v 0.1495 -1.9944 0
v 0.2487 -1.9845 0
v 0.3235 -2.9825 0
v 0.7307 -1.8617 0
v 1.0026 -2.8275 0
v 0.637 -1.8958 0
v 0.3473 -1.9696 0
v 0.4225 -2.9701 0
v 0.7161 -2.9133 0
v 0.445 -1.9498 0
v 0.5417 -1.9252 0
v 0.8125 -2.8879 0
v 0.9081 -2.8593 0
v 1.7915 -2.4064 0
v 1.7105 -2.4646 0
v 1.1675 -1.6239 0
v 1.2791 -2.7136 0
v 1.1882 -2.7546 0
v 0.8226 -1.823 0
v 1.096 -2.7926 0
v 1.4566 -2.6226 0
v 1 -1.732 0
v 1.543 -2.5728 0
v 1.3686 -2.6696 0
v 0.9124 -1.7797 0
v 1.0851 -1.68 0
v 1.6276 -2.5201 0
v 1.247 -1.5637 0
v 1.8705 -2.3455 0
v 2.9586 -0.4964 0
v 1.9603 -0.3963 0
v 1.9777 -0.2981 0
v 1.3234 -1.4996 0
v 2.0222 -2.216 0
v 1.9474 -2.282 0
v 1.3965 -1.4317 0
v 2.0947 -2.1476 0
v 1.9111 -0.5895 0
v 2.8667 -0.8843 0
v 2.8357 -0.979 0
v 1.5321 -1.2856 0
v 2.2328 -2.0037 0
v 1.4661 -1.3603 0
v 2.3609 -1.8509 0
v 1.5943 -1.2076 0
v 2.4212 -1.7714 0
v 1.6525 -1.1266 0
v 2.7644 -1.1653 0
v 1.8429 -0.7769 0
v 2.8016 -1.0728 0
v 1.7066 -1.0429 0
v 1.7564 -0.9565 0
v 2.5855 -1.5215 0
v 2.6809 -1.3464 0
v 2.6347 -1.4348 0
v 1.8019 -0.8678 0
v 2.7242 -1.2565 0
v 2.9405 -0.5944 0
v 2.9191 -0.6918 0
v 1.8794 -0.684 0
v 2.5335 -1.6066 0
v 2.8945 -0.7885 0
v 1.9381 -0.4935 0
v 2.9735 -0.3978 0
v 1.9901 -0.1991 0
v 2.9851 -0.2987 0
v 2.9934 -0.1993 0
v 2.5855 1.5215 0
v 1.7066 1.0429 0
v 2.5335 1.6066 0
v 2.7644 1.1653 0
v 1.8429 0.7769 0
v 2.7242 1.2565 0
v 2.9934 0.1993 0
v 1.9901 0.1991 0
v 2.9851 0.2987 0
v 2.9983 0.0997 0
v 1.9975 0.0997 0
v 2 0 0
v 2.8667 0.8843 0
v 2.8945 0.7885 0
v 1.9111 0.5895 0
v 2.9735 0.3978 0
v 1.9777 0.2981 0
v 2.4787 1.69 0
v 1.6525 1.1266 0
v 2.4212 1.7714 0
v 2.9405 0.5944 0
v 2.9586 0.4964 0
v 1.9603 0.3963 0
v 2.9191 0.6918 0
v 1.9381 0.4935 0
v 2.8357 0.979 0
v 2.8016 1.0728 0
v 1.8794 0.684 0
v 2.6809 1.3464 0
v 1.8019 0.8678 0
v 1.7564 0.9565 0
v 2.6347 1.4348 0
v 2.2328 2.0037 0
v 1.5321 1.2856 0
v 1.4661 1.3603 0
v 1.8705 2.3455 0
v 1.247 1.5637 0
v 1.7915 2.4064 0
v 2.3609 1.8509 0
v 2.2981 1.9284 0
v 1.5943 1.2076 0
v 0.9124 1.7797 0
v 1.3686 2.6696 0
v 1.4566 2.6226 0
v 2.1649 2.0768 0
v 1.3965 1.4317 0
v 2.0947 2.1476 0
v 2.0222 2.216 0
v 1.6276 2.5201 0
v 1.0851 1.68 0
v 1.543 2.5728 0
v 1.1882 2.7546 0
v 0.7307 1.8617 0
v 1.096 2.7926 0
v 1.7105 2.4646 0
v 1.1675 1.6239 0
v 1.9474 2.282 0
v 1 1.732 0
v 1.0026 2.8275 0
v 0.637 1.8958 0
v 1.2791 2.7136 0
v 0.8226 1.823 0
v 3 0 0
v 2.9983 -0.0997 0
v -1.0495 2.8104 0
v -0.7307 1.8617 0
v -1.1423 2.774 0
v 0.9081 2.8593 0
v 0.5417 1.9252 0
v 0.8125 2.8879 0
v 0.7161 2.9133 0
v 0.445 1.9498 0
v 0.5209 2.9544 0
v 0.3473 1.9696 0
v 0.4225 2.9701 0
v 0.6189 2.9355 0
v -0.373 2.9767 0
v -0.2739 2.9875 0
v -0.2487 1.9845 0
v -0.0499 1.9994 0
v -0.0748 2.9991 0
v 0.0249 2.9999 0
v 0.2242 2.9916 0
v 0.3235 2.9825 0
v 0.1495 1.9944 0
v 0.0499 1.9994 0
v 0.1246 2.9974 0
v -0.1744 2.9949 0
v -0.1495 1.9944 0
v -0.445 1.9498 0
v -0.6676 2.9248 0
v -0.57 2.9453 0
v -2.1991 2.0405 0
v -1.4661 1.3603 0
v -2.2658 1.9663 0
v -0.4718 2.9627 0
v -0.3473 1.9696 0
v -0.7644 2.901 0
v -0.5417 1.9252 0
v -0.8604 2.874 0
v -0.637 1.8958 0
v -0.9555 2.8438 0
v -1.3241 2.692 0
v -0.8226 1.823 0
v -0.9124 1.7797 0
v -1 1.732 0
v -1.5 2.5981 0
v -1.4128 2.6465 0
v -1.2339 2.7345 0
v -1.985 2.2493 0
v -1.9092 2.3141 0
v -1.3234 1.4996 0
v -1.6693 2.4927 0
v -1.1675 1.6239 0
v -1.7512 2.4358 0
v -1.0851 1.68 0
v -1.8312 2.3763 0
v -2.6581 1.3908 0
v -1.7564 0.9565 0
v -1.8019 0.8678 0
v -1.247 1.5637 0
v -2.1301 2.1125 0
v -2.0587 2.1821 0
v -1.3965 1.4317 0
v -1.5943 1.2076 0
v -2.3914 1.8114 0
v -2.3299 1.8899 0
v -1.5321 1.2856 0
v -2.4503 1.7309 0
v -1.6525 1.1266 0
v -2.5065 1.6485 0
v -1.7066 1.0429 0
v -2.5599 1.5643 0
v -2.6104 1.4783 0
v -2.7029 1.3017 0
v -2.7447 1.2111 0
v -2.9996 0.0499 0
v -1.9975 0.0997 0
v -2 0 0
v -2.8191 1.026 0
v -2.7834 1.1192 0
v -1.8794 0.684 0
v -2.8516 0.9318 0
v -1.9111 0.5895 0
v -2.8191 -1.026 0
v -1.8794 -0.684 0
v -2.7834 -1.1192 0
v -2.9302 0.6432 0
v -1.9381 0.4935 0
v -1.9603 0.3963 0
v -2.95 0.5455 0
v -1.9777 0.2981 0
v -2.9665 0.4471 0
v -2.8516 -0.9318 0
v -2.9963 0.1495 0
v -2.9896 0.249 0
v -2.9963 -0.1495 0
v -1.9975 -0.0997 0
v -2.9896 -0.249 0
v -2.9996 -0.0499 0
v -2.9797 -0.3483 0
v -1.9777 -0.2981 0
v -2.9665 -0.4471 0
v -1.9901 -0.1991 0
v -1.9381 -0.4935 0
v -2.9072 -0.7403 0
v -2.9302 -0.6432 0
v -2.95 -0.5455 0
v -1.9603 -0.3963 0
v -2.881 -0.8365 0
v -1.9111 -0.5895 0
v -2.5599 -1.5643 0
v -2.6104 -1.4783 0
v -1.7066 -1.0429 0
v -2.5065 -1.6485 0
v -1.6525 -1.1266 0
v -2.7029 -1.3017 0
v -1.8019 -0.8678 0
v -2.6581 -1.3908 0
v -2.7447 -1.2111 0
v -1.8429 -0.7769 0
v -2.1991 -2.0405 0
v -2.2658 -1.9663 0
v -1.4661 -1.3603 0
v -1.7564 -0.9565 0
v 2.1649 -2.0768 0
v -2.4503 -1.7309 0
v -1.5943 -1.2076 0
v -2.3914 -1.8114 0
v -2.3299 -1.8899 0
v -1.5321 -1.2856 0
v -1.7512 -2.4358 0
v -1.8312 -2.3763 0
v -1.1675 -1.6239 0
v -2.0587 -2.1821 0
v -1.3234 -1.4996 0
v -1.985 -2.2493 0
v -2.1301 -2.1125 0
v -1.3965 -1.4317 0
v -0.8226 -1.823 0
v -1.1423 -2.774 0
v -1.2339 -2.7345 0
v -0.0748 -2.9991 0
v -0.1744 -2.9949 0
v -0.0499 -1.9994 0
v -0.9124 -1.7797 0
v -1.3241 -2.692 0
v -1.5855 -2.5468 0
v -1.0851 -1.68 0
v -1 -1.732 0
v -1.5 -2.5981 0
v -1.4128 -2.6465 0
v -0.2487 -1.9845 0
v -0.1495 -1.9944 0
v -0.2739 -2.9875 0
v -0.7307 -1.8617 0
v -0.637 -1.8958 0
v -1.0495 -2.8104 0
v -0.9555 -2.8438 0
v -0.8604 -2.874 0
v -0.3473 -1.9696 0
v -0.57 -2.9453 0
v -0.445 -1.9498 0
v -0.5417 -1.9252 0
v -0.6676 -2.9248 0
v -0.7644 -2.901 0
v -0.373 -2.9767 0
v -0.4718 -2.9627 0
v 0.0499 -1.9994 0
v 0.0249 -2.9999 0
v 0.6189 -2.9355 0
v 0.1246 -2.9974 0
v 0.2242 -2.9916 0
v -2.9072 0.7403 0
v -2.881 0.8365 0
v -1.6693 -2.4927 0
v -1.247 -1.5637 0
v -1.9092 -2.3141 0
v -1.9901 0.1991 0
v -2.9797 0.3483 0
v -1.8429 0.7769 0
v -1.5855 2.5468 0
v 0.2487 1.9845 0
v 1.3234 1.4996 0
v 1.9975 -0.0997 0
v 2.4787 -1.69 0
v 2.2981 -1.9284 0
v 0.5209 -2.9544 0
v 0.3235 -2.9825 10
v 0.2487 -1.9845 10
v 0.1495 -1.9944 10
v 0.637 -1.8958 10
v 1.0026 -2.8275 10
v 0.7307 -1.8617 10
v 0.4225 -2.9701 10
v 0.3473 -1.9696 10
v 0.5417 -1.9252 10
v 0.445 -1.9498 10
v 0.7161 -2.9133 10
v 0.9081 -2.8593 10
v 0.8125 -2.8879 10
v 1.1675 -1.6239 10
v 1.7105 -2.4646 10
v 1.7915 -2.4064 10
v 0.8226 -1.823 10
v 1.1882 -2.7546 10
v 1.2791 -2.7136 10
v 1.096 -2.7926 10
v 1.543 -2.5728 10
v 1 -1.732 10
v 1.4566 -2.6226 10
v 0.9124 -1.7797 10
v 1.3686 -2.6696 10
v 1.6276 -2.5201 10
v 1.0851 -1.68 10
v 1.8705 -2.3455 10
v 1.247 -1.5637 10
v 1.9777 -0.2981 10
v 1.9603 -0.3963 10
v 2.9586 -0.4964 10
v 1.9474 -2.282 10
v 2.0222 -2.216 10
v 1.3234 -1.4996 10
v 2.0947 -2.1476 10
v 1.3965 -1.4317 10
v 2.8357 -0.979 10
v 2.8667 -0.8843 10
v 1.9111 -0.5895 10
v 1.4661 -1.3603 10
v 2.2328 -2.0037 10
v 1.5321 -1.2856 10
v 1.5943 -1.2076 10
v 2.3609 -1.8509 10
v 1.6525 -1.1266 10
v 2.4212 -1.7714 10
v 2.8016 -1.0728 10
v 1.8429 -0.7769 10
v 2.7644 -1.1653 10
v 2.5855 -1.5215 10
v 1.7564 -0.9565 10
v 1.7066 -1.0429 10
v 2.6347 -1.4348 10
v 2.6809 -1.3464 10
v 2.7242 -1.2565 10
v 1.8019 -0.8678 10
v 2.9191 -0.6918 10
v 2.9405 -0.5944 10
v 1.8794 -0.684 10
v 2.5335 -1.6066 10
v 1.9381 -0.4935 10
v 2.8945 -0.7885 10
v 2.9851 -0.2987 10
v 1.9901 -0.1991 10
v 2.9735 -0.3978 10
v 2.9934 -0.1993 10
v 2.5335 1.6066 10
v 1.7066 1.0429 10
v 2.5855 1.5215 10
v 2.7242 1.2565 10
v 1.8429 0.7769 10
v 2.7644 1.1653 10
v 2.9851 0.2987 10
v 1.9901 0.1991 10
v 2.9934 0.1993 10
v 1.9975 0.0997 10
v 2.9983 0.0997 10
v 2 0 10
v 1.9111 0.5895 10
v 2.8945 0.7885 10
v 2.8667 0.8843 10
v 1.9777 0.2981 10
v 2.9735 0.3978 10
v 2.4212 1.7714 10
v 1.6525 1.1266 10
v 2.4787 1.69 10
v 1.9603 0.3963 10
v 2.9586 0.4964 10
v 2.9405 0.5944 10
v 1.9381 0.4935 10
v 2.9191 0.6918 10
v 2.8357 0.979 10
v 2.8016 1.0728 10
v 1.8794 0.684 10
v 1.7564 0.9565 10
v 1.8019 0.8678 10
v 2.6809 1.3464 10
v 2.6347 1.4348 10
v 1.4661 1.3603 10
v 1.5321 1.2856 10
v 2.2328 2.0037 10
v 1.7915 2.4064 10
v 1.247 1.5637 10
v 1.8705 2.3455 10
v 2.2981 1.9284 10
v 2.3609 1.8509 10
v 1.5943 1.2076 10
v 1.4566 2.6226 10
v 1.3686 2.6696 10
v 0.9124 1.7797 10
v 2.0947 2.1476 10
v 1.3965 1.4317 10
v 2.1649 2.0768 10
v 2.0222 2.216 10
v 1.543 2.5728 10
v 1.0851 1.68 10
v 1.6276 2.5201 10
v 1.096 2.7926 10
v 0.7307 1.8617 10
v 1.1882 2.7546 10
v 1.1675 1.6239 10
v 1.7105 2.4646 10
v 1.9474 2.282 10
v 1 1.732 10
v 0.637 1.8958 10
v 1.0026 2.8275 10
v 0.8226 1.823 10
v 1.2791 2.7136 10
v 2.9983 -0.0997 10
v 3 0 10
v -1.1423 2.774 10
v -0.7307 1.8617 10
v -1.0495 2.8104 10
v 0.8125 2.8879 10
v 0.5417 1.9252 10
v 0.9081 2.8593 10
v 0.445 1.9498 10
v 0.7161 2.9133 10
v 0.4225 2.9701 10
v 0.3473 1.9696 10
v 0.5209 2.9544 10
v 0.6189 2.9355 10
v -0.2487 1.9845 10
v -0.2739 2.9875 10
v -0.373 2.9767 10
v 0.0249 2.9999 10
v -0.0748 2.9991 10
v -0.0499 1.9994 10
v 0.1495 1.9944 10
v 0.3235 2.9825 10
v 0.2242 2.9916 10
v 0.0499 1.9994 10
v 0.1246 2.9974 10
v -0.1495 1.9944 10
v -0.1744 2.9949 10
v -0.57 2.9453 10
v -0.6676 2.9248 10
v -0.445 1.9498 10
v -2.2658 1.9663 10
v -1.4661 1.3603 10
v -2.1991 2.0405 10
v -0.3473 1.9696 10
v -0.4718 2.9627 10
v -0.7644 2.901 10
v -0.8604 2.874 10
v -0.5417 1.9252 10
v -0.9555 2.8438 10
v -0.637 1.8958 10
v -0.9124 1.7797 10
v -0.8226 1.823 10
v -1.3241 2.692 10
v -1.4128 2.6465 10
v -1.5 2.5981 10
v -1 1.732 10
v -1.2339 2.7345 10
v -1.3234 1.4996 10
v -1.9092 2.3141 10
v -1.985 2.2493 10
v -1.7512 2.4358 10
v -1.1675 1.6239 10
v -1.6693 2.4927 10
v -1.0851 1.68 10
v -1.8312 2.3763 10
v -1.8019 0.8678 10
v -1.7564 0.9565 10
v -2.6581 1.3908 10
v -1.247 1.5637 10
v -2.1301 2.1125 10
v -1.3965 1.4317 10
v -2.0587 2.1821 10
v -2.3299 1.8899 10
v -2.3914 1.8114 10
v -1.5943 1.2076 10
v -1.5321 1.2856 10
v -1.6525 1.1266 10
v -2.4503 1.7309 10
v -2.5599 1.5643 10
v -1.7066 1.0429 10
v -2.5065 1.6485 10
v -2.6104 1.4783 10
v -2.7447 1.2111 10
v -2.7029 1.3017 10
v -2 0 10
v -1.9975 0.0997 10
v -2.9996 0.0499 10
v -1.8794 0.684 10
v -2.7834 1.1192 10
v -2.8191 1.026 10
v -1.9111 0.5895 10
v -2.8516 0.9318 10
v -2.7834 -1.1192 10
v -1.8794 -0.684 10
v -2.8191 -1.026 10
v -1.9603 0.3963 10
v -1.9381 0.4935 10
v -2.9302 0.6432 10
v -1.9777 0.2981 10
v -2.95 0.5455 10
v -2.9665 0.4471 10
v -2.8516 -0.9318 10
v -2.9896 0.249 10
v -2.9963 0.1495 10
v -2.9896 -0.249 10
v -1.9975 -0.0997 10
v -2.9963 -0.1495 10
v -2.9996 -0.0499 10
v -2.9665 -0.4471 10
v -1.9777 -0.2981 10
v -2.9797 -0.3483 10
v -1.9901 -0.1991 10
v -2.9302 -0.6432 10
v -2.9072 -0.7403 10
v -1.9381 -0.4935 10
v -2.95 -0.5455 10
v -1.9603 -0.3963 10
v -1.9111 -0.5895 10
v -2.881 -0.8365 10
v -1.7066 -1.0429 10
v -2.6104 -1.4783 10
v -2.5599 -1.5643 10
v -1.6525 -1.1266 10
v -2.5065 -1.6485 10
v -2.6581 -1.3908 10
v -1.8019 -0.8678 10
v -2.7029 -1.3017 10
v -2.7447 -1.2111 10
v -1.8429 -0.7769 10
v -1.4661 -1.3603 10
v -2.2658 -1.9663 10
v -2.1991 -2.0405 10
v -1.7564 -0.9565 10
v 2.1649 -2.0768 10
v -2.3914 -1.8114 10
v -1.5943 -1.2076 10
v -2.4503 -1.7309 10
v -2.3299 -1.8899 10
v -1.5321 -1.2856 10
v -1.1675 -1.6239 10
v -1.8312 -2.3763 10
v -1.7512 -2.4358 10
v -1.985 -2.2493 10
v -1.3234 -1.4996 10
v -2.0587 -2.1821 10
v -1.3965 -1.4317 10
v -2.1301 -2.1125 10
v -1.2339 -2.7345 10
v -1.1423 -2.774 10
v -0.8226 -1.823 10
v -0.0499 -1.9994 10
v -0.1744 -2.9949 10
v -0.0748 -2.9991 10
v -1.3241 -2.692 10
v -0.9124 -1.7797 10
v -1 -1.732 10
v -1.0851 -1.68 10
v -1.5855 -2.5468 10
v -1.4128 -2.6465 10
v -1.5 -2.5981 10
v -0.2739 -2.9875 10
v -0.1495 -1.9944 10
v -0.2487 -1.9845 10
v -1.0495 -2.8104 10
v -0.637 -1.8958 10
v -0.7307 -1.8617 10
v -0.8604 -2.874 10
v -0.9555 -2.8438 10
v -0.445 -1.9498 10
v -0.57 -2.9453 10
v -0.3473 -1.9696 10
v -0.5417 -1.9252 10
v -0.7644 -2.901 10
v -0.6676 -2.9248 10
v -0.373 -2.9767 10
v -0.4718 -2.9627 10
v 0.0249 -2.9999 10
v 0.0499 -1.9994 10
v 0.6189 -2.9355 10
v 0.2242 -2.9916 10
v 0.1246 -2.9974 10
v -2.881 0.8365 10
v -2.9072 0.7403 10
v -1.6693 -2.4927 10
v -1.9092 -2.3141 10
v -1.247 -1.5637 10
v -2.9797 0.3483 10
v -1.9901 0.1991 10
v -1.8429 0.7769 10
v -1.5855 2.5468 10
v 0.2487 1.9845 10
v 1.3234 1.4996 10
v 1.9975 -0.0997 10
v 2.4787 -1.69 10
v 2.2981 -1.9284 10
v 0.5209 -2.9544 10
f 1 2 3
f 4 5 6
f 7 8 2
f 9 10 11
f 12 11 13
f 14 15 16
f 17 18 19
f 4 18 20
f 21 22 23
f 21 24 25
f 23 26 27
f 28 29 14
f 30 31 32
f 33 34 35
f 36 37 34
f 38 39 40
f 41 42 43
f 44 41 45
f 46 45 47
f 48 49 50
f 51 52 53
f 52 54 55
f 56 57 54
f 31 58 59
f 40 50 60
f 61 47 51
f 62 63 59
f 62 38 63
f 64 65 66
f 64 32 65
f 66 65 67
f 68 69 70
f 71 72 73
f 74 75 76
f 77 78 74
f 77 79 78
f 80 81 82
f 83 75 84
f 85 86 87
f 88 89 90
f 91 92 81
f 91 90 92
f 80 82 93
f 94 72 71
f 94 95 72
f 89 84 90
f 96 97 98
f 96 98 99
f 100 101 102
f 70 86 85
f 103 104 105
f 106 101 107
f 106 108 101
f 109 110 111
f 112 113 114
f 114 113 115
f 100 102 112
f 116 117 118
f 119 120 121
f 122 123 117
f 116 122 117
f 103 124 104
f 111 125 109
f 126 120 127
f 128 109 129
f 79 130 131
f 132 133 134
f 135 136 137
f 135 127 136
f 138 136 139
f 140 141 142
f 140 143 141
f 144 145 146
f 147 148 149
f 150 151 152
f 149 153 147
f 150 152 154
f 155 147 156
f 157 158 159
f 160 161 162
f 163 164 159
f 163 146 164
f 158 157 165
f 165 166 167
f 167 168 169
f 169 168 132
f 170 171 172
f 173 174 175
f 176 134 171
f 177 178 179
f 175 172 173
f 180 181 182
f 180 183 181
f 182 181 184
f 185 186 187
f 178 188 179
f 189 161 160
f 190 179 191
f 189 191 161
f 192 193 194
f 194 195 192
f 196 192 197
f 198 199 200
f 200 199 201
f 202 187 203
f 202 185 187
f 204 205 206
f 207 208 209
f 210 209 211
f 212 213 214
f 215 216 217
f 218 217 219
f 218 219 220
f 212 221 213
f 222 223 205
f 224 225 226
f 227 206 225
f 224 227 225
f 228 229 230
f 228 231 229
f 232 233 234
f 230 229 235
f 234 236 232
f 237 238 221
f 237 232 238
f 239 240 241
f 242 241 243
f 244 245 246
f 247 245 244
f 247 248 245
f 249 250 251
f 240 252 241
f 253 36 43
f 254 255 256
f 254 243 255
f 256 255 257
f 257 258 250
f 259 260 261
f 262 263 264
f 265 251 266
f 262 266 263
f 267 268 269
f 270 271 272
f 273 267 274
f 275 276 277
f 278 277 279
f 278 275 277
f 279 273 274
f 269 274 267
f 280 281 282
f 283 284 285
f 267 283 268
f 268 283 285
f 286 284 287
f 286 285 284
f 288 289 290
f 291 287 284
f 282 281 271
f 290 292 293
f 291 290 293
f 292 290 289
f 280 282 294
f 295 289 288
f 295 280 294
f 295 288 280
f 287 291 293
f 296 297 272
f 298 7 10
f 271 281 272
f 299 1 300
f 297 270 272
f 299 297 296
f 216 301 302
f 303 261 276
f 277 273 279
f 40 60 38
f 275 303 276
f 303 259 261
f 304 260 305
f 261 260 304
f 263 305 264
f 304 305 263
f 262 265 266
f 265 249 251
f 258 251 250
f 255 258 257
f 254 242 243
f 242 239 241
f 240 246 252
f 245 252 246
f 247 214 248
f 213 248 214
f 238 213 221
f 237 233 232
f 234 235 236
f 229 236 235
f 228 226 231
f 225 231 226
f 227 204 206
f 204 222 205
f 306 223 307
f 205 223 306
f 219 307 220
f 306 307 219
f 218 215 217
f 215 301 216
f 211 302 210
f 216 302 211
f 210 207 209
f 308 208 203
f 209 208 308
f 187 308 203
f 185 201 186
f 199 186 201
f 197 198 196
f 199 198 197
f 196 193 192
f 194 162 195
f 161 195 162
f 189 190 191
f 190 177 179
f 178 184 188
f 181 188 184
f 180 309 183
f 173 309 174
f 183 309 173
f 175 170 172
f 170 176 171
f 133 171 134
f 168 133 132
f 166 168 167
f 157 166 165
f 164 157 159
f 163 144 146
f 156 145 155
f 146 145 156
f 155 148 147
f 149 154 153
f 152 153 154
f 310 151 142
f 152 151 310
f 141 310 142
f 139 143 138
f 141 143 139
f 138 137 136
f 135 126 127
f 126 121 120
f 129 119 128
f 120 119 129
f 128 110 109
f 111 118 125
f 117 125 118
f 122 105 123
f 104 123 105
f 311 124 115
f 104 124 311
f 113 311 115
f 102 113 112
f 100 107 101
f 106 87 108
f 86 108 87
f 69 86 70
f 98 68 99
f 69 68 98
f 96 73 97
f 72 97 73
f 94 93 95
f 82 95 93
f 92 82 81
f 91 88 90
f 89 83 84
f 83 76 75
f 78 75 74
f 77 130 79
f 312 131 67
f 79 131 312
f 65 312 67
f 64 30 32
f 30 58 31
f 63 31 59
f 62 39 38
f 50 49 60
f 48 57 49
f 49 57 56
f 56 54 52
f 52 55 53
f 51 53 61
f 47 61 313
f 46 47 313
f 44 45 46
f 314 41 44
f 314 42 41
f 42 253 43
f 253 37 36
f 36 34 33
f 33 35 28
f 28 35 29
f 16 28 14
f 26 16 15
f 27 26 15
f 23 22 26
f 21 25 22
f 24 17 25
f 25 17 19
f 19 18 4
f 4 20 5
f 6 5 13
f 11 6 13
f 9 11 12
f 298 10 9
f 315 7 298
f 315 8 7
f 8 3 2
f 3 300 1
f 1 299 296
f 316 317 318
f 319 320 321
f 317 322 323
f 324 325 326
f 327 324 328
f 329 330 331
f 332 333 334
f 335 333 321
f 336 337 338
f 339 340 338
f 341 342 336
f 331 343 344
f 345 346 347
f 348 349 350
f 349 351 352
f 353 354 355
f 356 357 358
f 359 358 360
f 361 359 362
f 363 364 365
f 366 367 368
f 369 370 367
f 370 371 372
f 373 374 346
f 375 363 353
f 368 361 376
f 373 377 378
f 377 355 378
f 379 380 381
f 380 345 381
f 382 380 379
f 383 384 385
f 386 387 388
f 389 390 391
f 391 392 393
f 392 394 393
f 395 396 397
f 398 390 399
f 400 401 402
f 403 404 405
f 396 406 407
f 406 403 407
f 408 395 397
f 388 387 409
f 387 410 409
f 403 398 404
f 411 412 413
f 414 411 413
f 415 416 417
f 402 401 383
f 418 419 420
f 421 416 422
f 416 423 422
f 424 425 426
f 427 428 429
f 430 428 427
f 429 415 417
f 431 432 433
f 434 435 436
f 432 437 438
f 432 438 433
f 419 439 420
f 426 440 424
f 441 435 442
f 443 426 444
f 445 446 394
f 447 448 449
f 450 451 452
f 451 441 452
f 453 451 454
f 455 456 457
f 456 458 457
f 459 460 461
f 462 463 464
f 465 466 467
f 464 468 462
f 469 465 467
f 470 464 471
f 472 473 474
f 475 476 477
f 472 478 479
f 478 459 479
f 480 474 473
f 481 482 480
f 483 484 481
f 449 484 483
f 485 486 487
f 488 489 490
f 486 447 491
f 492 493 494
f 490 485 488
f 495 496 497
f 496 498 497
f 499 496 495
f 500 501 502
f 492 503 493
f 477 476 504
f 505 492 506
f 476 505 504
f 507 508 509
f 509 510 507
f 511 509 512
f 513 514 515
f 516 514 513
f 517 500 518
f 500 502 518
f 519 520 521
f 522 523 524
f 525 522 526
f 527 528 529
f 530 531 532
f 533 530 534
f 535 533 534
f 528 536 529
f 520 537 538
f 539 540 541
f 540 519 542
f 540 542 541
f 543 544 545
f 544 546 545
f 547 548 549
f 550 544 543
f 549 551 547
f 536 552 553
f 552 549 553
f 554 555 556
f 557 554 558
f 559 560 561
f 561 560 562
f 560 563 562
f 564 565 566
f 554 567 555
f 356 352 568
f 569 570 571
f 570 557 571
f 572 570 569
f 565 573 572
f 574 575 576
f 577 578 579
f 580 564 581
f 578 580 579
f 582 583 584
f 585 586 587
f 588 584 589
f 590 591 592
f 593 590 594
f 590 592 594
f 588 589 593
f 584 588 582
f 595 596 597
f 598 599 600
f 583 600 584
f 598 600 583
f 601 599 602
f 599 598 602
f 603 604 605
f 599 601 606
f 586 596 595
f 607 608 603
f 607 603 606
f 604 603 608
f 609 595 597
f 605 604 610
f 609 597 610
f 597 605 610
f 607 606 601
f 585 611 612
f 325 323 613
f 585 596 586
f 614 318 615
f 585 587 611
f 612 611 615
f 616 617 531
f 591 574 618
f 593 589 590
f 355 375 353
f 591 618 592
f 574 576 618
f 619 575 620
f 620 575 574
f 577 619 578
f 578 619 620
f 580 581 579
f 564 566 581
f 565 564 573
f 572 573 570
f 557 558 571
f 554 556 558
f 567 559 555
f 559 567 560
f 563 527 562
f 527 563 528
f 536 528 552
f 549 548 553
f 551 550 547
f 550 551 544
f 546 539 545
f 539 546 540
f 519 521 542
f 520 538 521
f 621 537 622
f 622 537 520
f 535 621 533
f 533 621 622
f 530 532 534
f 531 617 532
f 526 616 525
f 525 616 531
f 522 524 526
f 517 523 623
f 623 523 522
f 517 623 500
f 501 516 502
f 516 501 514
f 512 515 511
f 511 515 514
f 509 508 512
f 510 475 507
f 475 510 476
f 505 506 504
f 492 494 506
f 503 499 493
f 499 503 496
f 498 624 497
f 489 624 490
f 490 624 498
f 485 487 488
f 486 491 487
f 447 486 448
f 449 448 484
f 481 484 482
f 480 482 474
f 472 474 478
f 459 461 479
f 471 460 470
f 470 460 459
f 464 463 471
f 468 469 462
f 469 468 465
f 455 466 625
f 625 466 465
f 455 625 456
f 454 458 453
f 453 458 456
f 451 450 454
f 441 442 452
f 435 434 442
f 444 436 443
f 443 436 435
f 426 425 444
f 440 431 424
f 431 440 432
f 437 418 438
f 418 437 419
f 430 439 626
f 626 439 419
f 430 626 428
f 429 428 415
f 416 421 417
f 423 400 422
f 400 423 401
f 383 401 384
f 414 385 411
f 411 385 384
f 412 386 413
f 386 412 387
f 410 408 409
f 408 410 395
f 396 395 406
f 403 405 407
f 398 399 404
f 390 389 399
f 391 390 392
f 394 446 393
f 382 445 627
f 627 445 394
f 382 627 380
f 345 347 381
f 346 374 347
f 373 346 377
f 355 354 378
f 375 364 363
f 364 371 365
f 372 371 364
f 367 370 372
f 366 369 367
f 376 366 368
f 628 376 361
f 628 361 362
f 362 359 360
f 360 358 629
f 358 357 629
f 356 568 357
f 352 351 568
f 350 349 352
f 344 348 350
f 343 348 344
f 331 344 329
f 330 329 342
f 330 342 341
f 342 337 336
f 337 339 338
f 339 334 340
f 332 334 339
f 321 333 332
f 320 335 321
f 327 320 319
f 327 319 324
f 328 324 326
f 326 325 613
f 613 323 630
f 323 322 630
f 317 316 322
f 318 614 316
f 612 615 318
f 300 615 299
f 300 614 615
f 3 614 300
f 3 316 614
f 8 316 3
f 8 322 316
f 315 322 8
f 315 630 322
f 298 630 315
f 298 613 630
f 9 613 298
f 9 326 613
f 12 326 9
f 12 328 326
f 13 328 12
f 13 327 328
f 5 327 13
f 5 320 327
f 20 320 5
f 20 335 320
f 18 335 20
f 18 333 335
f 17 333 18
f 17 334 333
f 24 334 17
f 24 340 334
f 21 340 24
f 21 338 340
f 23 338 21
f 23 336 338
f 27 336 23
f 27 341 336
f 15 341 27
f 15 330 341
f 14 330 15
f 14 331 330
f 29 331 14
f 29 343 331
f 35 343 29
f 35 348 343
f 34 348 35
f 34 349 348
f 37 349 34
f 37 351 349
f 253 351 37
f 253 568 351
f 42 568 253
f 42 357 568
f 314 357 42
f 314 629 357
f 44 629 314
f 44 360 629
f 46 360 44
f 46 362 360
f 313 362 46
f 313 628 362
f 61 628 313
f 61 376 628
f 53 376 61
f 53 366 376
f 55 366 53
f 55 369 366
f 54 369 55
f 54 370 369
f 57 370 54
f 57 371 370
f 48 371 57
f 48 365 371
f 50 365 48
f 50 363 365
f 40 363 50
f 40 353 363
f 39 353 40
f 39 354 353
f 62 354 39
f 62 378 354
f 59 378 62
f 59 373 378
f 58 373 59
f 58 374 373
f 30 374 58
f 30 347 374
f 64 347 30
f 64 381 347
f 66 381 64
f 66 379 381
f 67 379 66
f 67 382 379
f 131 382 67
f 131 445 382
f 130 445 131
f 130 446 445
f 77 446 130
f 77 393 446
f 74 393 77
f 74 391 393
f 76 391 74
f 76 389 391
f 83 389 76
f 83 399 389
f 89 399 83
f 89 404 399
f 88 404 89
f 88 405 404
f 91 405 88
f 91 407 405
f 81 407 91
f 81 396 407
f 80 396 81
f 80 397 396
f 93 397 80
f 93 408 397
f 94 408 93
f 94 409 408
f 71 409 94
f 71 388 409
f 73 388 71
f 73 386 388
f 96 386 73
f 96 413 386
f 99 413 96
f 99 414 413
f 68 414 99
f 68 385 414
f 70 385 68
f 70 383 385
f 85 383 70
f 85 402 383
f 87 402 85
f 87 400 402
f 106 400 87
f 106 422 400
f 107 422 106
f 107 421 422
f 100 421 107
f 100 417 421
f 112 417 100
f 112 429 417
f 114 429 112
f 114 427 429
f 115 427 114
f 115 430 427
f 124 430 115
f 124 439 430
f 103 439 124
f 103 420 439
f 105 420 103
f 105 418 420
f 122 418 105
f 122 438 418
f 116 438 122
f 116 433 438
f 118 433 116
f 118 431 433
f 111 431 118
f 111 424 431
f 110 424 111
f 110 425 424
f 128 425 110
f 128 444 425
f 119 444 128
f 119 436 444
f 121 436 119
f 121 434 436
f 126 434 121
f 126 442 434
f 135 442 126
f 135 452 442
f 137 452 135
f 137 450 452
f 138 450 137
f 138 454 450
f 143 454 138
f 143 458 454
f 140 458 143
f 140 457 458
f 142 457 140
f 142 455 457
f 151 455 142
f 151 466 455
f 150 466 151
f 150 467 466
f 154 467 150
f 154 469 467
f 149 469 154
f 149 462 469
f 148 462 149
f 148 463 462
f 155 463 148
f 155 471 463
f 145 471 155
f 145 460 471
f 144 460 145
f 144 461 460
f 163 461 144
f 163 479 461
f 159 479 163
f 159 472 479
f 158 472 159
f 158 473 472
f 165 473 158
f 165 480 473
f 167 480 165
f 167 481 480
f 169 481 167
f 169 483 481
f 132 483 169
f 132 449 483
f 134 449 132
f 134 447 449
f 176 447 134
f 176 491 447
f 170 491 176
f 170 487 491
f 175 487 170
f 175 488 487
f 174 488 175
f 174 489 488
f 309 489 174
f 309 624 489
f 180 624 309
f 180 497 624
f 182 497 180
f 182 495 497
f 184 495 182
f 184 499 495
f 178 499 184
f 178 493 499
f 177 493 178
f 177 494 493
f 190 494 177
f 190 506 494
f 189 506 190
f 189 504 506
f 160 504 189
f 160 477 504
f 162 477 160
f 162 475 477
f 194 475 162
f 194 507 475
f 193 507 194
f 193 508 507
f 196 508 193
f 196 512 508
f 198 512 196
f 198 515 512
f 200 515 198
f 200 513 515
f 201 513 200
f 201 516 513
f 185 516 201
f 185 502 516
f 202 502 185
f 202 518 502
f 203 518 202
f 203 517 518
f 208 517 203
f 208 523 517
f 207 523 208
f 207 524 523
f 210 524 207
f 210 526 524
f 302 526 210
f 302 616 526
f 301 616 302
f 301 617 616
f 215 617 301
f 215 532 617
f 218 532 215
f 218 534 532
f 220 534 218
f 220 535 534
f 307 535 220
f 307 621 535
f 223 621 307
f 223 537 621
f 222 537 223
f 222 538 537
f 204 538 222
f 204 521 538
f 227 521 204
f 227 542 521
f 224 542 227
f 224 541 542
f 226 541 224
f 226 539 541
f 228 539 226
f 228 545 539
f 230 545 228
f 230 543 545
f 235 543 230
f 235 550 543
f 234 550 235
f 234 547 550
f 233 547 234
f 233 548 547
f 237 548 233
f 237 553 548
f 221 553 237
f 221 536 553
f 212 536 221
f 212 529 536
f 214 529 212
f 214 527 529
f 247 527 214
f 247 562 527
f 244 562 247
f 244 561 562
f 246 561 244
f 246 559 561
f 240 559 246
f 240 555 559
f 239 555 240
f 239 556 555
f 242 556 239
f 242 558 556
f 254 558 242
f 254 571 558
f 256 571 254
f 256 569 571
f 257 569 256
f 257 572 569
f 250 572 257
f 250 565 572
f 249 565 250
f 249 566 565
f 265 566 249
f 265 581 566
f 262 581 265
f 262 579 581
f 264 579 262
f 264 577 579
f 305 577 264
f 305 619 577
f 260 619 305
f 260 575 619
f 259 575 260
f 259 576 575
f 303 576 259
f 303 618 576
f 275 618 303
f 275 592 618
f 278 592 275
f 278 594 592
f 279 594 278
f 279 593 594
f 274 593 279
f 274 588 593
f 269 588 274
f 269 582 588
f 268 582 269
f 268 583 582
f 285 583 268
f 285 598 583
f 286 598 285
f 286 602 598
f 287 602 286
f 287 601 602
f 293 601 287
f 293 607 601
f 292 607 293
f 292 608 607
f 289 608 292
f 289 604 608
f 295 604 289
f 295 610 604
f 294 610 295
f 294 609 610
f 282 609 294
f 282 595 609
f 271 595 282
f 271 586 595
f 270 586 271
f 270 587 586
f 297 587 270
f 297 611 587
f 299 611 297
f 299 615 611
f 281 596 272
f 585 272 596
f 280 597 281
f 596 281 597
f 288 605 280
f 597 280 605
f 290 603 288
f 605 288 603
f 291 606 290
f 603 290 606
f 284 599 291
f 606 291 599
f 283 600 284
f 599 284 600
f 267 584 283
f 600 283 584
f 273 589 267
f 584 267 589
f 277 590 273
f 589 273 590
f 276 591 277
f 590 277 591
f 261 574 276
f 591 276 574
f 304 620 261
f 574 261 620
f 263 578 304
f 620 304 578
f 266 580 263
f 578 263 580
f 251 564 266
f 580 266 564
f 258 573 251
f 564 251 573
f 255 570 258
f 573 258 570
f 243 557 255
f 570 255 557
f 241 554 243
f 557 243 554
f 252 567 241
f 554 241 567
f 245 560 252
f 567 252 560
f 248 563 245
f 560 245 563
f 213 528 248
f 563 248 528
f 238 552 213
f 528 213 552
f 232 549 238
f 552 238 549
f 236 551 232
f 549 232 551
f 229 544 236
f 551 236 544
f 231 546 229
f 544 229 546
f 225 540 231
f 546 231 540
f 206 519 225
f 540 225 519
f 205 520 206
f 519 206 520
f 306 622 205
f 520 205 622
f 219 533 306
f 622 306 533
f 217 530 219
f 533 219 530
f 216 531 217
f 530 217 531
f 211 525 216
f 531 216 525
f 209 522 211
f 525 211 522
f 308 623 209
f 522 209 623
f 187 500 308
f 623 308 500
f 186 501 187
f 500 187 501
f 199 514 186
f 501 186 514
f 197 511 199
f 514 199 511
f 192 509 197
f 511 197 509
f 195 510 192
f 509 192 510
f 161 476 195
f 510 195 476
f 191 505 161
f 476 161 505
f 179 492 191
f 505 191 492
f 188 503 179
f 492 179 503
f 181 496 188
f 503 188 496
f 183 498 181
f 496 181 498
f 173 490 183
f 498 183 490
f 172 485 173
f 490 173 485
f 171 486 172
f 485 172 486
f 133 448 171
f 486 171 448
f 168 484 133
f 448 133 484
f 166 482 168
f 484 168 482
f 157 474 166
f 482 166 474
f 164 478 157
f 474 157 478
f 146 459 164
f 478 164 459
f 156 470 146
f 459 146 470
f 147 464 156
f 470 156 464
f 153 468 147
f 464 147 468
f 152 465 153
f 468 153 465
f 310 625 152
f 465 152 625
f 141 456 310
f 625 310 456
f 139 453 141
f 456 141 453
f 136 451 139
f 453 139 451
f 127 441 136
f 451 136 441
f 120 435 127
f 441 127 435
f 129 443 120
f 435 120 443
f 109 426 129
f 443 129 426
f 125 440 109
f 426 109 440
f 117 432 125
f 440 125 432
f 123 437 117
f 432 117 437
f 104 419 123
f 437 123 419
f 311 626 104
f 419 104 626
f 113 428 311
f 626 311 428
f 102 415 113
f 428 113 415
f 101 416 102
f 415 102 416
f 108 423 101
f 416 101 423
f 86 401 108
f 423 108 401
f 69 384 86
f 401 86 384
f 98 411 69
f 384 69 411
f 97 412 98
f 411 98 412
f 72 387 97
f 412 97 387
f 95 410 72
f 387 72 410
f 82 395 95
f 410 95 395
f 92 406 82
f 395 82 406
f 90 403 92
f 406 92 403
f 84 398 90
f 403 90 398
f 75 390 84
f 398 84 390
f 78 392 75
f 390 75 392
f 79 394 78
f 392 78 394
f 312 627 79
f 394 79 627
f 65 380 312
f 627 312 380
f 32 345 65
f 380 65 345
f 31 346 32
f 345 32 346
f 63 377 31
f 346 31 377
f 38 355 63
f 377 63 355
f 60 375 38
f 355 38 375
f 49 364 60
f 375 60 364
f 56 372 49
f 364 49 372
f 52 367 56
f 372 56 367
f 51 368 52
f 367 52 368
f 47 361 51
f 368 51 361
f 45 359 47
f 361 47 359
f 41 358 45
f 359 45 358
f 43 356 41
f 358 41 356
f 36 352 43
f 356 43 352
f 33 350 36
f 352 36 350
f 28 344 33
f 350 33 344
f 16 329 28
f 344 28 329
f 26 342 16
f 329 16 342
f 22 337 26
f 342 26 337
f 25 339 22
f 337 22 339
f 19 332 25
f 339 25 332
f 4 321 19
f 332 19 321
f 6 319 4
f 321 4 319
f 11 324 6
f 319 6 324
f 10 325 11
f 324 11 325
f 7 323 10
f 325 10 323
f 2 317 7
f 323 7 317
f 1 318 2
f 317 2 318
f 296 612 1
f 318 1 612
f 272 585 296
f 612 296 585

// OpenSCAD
$fa = 1;
$fs = 0.1;

mm = 1;

height = 10 * mm;
id = 4 * mm;
od = 6 * mm;

module spacer()
{
    linear_extrude(height) difference()
    {
        circle(d = od);
        circle(d = id);
    }
}

spacer();
